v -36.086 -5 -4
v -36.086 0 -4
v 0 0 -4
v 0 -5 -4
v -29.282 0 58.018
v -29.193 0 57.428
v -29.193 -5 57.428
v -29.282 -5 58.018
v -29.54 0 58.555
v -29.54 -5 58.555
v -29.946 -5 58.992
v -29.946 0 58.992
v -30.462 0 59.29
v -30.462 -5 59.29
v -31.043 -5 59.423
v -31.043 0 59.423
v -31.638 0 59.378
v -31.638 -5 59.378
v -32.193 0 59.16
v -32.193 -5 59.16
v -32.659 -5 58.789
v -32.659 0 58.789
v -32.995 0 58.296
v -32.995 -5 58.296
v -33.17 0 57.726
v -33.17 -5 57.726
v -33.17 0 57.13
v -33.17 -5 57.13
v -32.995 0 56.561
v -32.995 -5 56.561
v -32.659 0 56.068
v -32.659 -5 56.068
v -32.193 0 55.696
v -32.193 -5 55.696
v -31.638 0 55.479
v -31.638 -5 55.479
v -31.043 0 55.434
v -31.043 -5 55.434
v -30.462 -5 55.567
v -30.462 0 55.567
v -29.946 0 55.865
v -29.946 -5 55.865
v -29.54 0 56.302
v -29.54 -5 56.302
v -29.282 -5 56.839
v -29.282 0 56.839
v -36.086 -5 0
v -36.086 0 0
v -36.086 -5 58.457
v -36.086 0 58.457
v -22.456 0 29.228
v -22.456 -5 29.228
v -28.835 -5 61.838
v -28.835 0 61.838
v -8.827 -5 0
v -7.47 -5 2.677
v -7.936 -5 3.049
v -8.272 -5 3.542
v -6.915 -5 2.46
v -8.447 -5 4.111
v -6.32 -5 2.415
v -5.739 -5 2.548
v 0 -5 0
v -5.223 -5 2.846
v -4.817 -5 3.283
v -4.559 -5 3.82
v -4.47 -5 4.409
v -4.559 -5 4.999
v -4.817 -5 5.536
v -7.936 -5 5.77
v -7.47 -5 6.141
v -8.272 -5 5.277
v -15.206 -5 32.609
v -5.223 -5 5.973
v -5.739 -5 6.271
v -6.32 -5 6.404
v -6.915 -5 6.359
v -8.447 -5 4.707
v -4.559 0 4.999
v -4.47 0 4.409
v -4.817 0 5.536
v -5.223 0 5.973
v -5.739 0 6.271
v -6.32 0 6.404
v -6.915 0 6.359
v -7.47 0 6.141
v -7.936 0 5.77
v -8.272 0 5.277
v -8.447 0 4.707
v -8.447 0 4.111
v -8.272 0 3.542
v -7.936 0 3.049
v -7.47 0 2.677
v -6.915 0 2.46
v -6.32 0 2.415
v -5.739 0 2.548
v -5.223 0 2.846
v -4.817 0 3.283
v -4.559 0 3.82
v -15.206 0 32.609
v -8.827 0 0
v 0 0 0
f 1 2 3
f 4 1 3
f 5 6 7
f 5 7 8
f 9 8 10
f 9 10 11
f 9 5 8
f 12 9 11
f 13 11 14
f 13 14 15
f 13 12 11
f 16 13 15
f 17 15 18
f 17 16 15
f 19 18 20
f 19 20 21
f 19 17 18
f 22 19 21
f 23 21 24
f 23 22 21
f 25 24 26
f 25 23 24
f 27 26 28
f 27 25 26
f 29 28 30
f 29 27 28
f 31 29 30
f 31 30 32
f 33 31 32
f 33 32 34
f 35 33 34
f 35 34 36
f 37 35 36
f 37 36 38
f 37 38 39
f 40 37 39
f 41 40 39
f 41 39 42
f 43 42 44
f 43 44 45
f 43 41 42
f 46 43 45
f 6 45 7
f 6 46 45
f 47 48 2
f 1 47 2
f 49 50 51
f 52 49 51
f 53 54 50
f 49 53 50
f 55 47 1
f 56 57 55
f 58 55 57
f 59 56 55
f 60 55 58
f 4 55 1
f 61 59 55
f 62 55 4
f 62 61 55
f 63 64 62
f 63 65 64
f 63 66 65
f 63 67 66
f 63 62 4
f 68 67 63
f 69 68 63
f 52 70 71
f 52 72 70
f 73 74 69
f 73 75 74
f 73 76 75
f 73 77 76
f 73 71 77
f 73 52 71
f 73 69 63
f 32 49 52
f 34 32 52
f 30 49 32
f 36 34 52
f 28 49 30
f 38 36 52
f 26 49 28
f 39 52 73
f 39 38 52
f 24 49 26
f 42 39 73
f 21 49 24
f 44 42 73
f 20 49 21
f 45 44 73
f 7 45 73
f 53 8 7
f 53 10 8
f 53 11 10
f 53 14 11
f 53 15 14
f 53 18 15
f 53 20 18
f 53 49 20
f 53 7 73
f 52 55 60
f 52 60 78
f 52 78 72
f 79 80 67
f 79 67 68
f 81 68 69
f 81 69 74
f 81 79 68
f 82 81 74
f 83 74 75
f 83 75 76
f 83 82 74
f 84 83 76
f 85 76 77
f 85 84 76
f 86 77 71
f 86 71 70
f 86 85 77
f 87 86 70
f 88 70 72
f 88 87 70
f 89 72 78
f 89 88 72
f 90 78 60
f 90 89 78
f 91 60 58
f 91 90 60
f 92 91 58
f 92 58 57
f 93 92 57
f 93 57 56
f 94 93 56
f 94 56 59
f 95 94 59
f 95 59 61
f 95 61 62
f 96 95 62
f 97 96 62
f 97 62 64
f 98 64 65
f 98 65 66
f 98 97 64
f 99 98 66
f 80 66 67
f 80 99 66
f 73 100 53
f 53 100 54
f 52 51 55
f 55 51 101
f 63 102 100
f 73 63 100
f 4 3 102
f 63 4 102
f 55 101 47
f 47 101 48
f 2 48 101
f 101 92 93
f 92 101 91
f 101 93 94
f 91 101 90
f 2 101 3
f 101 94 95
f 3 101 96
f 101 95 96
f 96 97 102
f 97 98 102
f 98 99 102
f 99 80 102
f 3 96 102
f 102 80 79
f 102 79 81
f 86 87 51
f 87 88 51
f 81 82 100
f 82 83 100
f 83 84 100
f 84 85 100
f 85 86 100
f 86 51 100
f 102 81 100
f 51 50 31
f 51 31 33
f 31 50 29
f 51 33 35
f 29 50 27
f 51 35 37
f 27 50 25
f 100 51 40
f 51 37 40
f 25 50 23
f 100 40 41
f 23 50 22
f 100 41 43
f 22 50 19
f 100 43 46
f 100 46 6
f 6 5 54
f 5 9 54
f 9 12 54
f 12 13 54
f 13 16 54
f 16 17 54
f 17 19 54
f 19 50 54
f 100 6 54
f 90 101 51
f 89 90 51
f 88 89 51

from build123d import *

# Parameters (mm, degrees)
F0_R     = 2
F1_DEPTH = 5


# Not quite as in the source:
# - a feature names something its author has since deleted; it is built from what else it names


with BuildPart() as f1:
    # F0 (on Front) → F1 (new body)
    with BuildSketch(Plane.XZ):
        Polygon((-8.8270233517, 0), (-36.085901234, 0), (-36.085901234, -4), (0, -4), (0, 0), (-15.2059999965, 32.6093722259), (-22.4564622928, 29.2284261319), align=None)
        with Locations((-6.4696469888, 4.4093964081)):
            Circle(F0_R, mode=Mode.SUBTRACT)
        Polygon((-36.085901234, 58.4568522639), (-22.4564622928, 29.2284261319), (-15.2059999965, 32.6093722259), (-28.8354389377, 61.8377983578), align=None)
        with Locations((-31.1928153006, 57.4284019497)):
            Circle(F0_R, mode=Mode.SUBTRACT)
    extrude(amount=F1_DEPTH)


solid = f1.part
